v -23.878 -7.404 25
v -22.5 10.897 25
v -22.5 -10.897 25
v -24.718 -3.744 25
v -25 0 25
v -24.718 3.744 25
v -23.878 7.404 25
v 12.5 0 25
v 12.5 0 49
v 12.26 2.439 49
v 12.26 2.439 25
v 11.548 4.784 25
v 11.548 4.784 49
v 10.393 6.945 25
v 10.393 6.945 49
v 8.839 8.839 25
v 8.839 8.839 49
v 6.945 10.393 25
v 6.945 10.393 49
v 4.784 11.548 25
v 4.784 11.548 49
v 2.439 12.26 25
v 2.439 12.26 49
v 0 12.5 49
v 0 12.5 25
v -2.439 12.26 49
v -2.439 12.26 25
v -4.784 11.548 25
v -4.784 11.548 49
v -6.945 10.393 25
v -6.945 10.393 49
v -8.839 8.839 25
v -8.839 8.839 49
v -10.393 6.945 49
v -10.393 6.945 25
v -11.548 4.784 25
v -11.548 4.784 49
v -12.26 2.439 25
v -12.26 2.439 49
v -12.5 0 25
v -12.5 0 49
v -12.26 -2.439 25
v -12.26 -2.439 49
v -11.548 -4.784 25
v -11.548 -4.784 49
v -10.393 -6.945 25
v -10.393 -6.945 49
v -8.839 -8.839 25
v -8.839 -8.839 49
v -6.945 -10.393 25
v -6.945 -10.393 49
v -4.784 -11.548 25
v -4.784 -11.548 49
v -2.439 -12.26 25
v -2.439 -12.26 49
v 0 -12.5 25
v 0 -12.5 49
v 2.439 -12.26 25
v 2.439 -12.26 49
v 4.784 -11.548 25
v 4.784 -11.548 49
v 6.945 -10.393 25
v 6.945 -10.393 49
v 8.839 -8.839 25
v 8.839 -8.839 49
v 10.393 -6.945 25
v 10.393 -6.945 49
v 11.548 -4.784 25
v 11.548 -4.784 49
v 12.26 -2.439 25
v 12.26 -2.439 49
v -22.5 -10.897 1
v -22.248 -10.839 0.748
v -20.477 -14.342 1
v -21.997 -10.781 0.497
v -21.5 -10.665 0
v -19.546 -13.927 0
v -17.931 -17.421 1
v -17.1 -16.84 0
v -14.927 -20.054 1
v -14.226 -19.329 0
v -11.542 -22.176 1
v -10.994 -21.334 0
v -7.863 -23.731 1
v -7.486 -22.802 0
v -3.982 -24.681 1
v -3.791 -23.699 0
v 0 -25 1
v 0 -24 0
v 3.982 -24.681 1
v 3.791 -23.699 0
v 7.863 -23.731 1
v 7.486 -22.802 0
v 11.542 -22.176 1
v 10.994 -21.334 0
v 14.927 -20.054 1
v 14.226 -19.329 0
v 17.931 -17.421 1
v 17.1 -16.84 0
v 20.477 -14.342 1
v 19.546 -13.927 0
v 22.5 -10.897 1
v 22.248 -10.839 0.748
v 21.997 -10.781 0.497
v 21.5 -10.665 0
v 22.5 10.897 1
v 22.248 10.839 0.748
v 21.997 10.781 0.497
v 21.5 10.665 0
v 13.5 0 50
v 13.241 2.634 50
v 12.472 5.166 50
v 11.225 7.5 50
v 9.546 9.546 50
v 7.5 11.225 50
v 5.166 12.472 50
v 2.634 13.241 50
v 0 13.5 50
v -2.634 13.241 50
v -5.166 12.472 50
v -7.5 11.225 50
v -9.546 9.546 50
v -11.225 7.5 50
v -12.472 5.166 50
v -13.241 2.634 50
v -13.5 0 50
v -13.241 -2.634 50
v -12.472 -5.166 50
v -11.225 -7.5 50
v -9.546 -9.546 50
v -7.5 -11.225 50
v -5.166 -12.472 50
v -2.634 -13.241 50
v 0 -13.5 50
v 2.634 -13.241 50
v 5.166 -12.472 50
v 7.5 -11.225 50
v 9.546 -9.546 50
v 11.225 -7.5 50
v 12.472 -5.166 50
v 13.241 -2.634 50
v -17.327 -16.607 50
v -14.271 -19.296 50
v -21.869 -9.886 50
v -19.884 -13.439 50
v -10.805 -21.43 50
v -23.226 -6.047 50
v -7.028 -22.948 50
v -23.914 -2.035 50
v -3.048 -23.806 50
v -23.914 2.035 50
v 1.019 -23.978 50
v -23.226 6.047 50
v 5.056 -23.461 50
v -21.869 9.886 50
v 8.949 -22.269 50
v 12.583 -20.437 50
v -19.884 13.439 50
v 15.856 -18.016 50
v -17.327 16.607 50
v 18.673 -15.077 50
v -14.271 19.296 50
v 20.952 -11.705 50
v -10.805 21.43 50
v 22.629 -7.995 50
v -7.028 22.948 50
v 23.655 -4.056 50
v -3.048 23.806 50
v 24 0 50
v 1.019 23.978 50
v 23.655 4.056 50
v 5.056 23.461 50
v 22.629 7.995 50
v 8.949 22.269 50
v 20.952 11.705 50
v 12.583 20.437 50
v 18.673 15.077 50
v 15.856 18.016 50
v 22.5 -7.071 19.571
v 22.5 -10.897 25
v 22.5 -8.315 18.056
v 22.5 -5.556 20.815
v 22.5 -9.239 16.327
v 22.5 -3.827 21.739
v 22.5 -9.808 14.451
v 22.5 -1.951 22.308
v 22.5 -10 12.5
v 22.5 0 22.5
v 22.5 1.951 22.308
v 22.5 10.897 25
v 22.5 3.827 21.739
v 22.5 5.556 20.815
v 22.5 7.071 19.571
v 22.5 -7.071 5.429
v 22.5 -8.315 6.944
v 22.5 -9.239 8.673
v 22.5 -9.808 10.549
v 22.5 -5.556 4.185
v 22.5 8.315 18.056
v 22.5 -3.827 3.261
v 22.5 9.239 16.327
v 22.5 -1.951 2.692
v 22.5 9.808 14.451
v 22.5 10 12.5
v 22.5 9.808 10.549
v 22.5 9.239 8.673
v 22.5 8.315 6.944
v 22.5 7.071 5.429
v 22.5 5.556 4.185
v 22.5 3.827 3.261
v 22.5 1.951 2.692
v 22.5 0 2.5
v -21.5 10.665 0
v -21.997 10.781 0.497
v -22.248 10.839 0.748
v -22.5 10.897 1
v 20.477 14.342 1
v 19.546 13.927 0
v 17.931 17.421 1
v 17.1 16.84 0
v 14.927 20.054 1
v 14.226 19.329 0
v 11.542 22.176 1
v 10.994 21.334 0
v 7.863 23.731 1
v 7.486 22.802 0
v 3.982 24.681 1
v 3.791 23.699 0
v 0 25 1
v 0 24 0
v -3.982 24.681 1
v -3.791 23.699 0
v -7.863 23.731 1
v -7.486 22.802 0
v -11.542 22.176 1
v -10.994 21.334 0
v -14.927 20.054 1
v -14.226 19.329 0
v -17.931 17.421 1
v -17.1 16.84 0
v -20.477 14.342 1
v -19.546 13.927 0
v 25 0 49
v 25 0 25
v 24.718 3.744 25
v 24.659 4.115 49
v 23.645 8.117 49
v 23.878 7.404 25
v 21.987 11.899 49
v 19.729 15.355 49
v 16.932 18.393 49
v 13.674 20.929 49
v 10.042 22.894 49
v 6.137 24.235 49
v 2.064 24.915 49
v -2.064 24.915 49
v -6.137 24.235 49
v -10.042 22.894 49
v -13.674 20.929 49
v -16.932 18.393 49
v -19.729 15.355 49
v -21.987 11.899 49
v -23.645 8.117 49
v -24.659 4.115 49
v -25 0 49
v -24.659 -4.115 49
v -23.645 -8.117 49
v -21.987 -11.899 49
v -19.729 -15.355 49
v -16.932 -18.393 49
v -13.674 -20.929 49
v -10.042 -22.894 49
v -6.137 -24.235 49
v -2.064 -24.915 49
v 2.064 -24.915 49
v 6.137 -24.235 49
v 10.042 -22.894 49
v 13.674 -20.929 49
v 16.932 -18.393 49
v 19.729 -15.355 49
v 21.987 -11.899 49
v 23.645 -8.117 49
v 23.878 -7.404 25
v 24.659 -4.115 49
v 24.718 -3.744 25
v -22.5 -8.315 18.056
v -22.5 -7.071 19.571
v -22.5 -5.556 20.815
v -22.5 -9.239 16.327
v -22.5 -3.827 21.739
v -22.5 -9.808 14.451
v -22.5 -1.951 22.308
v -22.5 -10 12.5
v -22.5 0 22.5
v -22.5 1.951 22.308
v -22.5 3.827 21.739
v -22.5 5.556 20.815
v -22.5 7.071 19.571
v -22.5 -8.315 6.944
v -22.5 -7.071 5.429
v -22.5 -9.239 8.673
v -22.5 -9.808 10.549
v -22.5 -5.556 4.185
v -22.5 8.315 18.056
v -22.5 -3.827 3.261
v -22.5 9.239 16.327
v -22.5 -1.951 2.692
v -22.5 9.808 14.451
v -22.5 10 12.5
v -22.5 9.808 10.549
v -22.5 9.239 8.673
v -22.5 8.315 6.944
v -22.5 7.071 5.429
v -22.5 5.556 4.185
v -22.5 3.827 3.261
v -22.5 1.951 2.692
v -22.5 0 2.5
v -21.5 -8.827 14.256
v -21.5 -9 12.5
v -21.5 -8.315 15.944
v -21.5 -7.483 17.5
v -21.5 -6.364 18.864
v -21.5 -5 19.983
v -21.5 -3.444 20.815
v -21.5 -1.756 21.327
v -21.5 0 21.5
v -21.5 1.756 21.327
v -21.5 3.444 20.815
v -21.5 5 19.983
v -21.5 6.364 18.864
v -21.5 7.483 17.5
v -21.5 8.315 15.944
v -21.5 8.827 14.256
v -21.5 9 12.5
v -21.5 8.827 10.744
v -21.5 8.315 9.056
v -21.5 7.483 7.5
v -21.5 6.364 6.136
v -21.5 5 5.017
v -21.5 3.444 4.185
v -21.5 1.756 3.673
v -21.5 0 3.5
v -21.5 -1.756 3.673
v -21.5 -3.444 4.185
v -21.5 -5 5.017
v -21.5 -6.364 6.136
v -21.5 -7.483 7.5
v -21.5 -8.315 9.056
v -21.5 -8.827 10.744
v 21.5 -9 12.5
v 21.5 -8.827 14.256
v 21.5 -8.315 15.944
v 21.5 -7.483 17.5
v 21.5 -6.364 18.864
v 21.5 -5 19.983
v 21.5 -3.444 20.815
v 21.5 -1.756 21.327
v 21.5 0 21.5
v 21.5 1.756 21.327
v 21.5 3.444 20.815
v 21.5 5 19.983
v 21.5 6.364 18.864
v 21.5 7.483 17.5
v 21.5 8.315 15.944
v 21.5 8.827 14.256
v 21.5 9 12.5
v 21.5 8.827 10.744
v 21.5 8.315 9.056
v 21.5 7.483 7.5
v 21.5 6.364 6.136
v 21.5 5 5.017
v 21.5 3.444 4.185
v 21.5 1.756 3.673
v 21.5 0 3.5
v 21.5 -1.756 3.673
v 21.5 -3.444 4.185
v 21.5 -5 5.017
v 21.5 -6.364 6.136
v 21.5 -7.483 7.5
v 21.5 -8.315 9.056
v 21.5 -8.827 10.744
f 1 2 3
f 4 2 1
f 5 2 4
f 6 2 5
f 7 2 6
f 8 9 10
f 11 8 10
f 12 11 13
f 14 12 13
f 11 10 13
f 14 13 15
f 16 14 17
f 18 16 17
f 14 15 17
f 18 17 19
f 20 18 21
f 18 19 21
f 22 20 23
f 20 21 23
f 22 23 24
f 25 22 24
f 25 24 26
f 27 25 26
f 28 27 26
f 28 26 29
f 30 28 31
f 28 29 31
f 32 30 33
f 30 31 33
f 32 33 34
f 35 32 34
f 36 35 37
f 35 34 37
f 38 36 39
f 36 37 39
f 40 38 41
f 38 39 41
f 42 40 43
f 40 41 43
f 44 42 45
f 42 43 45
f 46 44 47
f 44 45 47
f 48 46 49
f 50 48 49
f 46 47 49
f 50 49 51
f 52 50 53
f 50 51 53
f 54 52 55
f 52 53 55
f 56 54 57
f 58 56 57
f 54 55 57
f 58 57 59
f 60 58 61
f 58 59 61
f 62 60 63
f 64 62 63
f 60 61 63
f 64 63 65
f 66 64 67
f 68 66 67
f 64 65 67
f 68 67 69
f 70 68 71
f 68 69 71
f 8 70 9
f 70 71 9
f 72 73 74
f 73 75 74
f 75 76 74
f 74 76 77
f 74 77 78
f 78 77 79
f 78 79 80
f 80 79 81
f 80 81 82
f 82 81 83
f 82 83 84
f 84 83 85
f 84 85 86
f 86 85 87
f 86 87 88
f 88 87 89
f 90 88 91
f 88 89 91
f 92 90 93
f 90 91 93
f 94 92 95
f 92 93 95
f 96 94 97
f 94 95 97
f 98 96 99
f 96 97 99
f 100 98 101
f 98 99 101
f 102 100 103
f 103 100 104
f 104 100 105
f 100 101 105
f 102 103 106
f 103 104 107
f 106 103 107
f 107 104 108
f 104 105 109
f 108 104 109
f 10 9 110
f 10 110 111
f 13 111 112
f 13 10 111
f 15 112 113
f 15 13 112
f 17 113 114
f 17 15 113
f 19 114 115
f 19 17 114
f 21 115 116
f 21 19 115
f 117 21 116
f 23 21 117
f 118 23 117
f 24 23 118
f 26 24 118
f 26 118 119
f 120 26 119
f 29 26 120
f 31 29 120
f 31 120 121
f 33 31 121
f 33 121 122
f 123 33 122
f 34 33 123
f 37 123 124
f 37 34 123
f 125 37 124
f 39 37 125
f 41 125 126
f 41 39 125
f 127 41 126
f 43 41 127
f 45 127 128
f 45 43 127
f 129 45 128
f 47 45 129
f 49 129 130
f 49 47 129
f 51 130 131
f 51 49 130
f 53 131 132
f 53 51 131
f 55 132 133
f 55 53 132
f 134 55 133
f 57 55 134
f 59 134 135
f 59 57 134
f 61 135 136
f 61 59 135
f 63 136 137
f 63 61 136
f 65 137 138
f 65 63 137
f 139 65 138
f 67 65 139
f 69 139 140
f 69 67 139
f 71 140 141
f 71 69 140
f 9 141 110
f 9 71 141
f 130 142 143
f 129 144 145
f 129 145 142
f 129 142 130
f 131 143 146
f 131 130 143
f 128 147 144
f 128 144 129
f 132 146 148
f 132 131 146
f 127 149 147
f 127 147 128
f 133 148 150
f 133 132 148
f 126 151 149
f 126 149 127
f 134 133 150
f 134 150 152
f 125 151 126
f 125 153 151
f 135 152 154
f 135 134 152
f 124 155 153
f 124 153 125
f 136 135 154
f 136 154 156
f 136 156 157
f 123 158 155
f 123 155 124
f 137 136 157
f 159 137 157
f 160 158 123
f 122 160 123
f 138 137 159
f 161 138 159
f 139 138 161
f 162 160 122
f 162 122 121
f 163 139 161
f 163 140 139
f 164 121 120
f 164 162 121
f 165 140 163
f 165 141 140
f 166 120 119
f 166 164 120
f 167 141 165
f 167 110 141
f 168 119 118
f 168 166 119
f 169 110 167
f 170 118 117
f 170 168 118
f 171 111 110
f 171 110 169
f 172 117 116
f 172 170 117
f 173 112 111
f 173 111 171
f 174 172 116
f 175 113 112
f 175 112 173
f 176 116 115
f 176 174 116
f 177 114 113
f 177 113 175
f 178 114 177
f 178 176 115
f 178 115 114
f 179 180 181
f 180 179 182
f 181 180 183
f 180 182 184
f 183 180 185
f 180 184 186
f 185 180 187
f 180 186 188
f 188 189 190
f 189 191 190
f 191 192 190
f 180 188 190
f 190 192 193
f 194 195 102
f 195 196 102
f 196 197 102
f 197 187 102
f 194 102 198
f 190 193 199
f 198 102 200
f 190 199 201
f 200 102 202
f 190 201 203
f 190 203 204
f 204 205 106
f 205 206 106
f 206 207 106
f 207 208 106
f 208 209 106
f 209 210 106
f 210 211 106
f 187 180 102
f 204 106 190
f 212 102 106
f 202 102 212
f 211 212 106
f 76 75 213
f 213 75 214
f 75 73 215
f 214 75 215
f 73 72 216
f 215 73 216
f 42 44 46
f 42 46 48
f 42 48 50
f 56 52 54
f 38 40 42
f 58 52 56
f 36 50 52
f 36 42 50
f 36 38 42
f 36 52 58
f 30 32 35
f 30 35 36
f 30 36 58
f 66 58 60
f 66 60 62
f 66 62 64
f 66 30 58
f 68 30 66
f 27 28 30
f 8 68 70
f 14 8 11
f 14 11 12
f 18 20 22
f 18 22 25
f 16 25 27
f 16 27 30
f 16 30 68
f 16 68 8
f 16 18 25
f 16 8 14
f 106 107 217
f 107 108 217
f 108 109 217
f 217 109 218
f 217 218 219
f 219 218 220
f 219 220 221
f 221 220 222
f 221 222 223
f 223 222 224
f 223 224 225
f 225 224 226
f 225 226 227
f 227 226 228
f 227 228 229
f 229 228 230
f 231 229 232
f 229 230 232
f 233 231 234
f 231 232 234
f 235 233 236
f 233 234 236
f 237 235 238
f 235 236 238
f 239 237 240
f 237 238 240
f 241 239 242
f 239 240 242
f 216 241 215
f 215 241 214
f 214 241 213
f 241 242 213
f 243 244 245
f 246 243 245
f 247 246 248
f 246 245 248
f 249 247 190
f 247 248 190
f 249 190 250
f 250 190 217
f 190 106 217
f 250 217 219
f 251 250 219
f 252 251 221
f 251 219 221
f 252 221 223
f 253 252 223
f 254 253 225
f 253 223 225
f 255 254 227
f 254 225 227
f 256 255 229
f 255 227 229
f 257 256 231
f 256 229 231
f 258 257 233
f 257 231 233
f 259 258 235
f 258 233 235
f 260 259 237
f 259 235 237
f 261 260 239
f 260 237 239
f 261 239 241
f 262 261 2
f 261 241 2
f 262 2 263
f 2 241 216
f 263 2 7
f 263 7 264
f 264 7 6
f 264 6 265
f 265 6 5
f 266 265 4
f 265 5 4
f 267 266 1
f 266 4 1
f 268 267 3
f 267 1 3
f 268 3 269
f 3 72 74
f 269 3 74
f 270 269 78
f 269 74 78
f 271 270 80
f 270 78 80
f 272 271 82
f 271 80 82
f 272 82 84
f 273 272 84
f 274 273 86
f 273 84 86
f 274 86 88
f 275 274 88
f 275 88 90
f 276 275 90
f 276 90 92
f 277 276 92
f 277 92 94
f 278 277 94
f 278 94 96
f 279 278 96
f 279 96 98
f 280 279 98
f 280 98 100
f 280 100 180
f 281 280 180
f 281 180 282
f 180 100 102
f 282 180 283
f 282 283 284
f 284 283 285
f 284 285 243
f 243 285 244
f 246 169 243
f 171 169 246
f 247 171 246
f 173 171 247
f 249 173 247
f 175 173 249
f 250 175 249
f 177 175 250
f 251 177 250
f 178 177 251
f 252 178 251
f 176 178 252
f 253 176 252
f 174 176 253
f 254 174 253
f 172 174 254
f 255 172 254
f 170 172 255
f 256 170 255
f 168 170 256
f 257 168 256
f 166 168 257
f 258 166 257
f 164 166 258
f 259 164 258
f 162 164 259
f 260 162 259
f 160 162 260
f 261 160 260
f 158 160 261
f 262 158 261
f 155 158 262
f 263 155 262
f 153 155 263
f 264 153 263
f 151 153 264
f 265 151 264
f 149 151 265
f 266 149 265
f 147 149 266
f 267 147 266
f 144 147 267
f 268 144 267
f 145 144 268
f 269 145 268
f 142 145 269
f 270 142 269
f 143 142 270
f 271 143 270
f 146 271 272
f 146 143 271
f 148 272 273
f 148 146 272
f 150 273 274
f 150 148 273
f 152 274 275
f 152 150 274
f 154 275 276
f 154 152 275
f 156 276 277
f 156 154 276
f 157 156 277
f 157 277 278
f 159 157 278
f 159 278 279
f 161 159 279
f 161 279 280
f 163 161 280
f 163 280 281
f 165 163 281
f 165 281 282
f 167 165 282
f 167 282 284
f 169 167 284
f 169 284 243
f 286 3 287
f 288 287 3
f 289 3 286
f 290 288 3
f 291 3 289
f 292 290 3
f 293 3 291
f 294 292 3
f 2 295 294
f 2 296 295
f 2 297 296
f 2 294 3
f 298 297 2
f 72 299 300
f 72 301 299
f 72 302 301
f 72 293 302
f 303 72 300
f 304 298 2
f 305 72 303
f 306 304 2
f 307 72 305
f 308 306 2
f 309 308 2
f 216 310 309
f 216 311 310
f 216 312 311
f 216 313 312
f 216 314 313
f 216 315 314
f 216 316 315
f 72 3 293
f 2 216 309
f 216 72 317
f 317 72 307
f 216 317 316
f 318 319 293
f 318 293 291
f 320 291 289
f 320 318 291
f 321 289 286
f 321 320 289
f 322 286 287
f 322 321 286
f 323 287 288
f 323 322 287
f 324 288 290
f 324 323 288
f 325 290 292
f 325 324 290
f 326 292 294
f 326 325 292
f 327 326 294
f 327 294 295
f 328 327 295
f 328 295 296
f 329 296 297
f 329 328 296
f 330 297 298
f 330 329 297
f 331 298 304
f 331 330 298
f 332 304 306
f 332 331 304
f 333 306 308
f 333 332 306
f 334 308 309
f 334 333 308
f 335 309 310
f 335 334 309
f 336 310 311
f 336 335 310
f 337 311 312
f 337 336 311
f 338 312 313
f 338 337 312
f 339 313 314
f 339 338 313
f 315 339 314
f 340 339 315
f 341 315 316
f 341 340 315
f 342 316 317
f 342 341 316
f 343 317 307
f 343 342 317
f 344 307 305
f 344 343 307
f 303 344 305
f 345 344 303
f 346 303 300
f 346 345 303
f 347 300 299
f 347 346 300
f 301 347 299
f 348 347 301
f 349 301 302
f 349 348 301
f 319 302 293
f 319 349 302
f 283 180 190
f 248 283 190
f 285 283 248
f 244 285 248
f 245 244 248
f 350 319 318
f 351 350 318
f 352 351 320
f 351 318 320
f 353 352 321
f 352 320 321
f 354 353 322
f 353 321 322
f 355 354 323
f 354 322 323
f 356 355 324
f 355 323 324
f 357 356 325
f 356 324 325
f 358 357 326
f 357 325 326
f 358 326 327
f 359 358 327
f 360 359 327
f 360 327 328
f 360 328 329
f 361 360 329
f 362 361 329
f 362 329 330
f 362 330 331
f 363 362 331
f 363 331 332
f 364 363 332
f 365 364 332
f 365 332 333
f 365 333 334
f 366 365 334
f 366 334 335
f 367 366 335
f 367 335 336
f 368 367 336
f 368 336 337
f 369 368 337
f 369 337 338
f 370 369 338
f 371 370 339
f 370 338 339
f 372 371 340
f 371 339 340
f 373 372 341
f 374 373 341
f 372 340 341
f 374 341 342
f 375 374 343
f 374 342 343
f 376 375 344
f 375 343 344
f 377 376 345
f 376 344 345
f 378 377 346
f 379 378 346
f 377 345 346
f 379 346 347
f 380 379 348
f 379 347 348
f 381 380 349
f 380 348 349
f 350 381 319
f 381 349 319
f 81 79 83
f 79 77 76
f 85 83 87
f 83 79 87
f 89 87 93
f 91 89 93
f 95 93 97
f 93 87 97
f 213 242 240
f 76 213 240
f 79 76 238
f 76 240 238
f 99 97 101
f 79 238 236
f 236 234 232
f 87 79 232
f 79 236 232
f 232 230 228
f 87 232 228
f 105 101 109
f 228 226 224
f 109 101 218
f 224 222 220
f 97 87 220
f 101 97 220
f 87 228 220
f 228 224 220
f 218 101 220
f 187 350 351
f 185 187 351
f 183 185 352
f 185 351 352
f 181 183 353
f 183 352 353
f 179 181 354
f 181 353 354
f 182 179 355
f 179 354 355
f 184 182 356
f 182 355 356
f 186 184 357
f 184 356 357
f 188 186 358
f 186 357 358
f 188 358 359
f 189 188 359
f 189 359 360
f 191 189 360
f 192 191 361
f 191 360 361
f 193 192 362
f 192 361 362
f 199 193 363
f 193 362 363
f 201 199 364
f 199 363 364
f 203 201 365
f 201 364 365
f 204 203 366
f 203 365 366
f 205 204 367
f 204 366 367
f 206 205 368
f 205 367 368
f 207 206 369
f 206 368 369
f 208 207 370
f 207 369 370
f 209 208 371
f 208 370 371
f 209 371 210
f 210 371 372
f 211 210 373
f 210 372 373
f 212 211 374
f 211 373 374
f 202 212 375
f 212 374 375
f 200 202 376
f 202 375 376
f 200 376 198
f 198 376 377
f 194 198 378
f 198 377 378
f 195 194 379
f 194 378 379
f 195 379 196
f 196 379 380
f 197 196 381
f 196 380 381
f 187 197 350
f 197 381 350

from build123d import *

# Parameters (mm, degrees)
F0_R     = 25
F1_DEPTH = 50
F2_W     = 23.745389397
F2_H     = 47.3247256844
F2_W_2   = 14.1143929356
F3_DEPTH = 25
F5_D     = 18
F6_R     = 12.5
F7_DEPTH = 25
F8_SIZE  = 1


with BuildPart() as f1:
    # F0 (on Top) → F1 (new body)
    with BuildSketch(Plane.XY):
        Circle(F0_R)
    extrude(amount=F1_DEPTH)

    # F2 (on Top) → F3 (cut)
    with BuildSketch(Plane.XY):
        with Locations((34.3726946985, 1.0396027938)):
            Rectangle(F2_W, F2_H)
        with Locations((-29.5571964678, 1.0396027938)):
            Rectangle(F2_W_2, F2_H)
    extrude(amount=F3_DEPTH, mode=Mode.SUBTRACT)

    # F5 (through all)
    with Locations(Plane.YZ.offset(22.5)):
        with Locations((0, 12.5)):
            Hole(F5_D / 2)

    # F6 (on face) → F7 (cut)
    with BuildSketch(Plane.XY.offset(50)):
        Circle(F6_R)
    extrude(amount=-F7_DEPTH, mode=Mode.SUBTRACT)

    # F8
    f8_edges = [f1.edges().sort_by_distance(p)[0] for p in [
        (-25, 0, 50),
        (0, 25, 0),
        (0, -25, 0),
        (22.5, 0, 0),
        (-22.5, 0, 0),
        (-12.5, 0, 50),
        (22.5, -9, 12.5),
        (-22.5, -9, 12.5),
    ]]
    chamfer(f8_edges, length=F8_SIZE)


solid = f1.part
